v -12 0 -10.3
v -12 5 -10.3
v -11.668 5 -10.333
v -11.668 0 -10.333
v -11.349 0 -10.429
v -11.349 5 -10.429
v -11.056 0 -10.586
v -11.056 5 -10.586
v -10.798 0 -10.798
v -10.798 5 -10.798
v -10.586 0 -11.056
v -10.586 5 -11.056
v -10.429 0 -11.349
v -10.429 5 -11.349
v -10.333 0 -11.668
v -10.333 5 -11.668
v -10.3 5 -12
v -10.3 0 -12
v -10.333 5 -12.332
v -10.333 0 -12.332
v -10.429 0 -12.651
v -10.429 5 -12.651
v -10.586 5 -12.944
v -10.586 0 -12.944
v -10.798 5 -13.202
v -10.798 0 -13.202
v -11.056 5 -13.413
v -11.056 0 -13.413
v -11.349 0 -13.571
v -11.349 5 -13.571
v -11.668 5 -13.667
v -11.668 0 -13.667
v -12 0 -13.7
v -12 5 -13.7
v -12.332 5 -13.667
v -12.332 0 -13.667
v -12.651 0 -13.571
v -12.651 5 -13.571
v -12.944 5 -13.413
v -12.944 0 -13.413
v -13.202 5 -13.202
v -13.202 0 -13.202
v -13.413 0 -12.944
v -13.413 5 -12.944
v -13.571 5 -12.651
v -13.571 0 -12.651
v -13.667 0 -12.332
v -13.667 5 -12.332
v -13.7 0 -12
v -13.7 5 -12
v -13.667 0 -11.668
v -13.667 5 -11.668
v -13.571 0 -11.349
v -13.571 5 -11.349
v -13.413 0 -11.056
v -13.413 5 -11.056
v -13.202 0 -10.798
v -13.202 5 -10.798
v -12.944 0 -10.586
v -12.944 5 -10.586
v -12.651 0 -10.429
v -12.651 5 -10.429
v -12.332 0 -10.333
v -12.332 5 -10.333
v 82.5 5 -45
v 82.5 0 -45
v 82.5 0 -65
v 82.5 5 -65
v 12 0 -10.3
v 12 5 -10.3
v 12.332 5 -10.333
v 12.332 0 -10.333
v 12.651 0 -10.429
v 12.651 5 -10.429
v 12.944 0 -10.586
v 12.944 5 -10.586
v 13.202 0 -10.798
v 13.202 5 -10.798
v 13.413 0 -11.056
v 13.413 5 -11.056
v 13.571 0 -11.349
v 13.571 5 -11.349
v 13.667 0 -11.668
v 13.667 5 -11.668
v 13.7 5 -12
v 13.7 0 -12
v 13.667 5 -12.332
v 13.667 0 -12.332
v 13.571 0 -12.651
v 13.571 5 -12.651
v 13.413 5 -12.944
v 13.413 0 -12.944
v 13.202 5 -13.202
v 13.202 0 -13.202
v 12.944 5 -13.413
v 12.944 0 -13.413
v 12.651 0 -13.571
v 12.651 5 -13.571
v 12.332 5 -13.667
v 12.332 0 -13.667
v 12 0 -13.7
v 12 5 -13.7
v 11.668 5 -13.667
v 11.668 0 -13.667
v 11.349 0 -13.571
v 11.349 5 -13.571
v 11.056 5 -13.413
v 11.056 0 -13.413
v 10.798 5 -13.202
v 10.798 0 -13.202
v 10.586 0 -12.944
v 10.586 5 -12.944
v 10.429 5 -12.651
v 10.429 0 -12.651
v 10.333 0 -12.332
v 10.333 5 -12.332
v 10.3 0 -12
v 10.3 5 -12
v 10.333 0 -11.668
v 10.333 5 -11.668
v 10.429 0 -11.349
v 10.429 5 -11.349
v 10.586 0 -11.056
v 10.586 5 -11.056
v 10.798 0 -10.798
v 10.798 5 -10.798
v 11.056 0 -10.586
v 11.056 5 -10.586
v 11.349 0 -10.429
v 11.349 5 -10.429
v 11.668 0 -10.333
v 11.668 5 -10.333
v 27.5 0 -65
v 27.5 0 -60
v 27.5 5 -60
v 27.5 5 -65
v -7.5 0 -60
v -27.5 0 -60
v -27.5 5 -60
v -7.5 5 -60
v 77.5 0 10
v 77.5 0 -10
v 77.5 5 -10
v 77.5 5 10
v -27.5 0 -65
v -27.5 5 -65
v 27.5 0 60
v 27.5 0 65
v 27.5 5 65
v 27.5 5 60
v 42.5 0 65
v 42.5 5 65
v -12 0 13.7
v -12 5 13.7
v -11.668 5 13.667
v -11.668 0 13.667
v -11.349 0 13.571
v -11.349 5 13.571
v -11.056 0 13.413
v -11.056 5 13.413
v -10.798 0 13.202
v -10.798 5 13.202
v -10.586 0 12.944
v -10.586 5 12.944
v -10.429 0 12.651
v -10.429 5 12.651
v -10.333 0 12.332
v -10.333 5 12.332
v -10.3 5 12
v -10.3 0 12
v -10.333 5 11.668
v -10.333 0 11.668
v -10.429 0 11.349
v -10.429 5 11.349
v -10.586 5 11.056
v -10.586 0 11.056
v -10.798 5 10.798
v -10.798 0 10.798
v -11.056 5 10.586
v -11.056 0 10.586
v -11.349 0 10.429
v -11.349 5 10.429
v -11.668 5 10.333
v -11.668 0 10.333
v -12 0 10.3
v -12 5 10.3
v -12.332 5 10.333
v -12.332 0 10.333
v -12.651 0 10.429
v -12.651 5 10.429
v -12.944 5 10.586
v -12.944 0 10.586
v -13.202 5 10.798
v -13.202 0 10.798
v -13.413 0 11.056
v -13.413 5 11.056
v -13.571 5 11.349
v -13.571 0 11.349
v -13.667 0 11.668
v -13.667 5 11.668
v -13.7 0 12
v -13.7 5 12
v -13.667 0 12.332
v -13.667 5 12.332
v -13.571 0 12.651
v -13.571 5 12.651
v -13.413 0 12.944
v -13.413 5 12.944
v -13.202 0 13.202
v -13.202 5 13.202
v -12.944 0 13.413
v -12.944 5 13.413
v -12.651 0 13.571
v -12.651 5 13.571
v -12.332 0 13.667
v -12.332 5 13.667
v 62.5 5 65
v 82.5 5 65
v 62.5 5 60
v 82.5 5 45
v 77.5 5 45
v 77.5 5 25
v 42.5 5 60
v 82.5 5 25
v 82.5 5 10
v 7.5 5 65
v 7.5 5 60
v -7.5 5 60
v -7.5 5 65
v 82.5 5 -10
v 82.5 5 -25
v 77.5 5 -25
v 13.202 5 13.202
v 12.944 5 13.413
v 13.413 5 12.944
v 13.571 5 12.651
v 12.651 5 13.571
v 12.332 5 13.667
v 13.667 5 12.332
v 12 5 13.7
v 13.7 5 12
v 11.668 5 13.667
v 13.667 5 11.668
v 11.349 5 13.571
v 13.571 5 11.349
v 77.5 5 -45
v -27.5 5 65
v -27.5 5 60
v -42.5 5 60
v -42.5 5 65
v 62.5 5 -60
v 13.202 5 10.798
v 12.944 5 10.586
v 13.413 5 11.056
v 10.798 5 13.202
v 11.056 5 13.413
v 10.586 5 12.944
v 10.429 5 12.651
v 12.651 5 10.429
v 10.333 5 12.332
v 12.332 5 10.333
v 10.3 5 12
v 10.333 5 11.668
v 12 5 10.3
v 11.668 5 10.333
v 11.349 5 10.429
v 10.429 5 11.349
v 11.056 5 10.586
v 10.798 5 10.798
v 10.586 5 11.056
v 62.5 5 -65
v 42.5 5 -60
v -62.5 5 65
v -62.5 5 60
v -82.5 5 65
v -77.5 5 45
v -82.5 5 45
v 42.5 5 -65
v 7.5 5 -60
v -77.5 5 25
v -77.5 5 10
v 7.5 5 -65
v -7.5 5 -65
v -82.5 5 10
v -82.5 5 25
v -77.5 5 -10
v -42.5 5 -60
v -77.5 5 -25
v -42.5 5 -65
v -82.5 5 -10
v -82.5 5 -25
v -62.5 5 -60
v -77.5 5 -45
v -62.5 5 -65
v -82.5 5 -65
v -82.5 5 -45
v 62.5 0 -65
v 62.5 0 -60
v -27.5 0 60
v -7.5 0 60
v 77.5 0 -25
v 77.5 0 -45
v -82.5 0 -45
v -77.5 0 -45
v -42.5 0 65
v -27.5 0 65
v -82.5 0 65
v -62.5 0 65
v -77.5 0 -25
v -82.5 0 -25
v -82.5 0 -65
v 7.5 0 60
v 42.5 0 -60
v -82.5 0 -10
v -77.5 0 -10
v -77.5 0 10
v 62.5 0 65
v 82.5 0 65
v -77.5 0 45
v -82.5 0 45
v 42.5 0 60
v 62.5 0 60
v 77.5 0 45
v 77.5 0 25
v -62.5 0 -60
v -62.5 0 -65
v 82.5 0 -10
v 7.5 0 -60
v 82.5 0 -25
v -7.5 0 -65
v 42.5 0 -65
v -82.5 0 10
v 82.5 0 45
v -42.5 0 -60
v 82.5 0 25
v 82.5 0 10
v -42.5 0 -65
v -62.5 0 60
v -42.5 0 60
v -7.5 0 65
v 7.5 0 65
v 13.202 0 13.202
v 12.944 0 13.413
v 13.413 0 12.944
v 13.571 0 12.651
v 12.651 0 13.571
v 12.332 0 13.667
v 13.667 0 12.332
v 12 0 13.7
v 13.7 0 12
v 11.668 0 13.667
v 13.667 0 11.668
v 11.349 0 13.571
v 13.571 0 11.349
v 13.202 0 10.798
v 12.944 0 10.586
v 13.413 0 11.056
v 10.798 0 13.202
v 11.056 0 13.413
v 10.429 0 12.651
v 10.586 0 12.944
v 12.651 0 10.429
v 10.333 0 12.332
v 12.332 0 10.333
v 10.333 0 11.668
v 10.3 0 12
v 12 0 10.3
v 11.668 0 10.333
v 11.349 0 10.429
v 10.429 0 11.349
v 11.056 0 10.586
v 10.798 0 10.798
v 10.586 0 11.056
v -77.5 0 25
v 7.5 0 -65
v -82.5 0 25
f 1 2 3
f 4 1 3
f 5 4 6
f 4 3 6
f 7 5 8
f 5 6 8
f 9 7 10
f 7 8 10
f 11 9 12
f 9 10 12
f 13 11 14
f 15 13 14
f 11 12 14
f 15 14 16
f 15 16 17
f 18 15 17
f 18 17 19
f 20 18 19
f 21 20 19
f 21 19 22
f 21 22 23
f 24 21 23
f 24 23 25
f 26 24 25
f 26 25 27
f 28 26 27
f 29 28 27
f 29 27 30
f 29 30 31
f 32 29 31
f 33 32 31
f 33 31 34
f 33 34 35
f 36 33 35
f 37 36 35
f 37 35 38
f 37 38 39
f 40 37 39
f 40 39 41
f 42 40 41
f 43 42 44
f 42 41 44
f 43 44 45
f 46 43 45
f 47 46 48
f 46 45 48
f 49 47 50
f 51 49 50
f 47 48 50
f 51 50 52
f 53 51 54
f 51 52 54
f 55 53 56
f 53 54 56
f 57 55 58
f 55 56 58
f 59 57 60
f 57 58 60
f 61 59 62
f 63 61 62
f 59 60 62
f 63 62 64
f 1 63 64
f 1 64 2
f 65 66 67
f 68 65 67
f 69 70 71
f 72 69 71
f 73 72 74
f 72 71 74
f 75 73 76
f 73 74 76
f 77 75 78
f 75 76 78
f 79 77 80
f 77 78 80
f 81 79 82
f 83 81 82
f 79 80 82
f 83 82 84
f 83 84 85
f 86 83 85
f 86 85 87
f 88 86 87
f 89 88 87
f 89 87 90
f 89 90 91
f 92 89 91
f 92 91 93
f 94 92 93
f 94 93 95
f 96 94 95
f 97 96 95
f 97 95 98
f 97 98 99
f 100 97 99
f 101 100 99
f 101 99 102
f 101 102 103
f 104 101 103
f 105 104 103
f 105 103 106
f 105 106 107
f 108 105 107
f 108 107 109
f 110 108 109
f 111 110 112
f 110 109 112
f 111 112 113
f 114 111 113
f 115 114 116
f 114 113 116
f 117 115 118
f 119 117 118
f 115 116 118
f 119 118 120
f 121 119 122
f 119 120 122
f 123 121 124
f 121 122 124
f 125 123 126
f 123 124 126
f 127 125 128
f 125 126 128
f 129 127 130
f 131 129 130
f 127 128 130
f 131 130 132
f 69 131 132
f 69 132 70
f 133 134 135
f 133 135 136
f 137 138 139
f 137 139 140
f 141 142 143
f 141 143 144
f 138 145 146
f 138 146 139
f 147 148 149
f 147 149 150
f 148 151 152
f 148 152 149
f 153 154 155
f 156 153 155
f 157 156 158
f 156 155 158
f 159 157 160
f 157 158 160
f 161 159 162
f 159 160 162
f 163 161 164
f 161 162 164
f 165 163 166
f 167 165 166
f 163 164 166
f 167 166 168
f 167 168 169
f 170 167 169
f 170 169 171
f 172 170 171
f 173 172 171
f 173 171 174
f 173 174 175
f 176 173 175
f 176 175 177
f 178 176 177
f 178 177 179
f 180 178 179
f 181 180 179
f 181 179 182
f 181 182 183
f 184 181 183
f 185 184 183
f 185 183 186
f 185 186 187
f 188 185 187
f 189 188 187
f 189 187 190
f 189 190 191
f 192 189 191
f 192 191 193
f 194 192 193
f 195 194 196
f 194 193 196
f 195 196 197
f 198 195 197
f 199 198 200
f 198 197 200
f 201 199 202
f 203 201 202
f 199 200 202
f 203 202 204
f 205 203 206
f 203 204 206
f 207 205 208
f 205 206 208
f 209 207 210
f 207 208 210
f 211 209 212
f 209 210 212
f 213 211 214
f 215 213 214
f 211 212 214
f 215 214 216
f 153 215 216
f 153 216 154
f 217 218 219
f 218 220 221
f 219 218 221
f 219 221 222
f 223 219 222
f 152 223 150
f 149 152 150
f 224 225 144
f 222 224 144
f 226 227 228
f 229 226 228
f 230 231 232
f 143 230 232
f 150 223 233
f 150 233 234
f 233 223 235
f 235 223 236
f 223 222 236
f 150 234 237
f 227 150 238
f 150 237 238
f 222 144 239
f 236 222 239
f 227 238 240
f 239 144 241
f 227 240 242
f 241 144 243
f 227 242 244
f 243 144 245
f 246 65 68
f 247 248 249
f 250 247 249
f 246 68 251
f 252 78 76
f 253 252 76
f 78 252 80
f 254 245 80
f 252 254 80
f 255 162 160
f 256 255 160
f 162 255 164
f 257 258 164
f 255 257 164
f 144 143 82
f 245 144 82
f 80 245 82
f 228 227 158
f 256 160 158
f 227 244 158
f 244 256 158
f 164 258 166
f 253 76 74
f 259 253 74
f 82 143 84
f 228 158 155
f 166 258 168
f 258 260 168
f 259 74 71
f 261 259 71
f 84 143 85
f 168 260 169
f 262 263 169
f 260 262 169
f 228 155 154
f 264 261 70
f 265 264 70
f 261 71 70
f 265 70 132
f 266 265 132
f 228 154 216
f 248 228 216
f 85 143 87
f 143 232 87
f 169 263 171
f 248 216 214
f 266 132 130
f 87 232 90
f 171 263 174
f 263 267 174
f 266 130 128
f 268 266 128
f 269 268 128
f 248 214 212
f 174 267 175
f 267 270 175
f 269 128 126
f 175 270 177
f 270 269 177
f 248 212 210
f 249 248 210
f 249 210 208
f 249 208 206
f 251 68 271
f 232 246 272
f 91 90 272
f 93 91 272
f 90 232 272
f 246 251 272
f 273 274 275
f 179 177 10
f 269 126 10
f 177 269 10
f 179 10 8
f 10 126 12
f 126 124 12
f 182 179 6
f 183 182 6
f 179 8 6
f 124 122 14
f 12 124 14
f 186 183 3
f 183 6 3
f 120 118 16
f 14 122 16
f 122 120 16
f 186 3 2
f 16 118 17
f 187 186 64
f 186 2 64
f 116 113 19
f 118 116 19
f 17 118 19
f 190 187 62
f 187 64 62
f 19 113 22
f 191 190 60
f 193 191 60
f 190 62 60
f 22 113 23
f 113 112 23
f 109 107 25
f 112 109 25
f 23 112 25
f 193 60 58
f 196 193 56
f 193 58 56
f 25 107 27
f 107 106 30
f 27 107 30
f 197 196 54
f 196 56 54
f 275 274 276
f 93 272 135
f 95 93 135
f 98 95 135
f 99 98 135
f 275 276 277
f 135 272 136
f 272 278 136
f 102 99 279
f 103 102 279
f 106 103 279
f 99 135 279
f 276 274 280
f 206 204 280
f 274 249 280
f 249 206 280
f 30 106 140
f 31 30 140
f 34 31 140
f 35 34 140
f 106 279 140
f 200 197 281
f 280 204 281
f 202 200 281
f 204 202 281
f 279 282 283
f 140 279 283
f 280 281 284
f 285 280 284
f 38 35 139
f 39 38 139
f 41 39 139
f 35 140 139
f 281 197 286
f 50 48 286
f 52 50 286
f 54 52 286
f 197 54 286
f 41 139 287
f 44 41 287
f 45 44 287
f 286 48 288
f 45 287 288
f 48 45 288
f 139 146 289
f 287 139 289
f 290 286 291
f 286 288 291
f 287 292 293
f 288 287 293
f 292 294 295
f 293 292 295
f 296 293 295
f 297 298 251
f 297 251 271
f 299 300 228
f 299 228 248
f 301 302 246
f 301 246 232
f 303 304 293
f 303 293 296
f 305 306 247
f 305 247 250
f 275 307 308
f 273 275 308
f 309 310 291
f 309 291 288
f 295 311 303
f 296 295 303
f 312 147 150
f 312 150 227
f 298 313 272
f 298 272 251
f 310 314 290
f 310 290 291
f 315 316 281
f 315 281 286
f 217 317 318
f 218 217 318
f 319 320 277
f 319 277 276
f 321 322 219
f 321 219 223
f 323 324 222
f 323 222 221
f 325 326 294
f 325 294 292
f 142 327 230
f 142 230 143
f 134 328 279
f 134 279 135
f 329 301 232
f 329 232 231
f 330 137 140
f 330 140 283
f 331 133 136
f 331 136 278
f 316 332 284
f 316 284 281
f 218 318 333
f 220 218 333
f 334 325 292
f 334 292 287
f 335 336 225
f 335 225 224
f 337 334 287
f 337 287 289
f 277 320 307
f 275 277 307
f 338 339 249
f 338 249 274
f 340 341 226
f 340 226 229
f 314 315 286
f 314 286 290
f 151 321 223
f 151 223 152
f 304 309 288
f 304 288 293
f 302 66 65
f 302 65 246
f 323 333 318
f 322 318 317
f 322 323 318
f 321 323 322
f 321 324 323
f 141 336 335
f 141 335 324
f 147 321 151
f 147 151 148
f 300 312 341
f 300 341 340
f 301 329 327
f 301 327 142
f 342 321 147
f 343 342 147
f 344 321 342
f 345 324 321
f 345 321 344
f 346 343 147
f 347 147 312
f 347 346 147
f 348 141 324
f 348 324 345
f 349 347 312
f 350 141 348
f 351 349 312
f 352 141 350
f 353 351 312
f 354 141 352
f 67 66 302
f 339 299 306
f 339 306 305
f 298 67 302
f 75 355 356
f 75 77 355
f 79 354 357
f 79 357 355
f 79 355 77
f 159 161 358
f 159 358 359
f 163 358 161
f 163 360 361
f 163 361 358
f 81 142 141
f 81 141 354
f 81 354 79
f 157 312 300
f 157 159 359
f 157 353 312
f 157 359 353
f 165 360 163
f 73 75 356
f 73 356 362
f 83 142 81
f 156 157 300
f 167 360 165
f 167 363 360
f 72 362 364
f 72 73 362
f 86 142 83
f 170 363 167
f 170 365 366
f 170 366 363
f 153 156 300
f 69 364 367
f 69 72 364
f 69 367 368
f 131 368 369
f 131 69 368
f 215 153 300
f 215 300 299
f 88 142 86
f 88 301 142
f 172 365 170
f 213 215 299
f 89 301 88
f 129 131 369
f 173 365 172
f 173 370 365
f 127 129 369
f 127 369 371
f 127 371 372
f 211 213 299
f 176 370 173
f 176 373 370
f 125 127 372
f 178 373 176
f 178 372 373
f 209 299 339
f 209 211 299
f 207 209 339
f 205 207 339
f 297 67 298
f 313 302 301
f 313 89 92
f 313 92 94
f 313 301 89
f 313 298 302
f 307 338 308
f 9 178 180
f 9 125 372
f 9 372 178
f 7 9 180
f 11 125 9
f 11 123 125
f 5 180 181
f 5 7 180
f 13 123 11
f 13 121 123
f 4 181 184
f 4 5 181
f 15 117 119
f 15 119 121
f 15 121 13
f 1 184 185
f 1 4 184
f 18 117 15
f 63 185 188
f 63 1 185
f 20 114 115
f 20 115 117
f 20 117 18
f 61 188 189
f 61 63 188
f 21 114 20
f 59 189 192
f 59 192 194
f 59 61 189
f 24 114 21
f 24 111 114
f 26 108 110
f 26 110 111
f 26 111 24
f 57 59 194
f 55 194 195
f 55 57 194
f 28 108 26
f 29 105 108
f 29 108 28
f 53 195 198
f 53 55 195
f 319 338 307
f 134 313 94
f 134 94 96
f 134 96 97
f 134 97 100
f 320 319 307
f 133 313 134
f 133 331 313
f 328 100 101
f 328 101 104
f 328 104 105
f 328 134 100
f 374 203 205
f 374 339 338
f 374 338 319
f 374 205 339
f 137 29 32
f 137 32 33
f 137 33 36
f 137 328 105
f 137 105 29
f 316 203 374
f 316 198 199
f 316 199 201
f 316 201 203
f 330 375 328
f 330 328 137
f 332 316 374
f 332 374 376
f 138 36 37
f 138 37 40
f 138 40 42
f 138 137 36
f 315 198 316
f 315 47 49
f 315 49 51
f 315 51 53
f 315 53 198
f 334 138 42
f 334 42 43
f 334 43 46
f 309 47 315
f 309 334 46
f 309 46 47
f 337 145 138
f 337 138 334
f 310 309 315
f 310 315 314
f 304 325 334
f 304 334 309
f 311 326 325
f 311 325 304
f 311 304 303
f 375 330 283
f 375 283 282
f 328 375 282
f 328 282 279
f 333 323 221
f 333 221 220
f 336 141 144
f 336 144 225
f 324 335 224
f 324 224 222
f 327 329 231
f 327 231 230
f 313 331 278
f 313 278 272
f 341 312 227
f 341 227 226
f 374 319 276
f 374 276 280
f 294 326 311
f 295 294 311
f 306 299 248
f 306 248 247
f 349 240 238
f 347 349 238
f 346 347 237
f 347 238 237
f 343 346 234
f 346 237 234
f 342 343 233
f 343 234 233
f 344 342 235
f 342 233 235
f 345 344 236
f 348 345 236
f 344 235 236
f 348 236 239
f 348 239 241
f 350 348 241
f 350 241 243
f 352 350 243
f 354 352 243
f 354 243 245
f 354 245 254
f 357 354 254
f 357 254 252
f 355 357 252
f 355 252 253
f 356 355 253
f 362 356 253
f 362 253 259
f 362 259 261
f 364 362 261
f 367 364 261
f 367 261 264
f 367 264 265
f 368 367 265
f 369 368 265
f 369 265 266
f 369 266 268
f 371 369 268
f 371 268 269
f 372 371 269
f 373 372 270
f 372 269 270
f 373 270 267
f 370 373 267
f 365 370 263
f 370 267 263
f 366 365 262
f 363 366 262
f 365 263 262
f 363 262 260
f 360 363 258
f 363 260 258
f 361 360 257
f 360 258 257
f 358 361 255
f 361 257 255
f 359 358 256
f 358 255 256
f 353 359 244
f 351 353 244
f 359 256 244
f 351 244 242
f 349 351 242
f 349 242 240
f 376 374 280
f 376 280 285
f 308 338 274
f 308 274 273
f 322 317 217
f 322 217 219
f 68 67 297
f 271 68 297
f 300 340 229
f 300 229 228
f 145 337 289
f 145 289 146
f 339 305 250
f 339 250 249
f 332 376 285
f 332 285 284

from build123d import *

# Parameters (mm, degrees)
BOSS_EXTRUDE1_DEPTH = 5
SKETCH2_R           = 1.7
CUT_EXTRUDE1_DEPTH  = 10


with BuildPart() as part:
    # Sketch1 → Boss-Extrude1 (new body)
    with BuildSketch(Plane(origin=(0, 0, 0), x_dir=(1, 0, 0), z_dir=(0, 1, 0))):
        Polygon((-82.5, 60), (-82.5, 65), (-77.5, 65), (-62.5, 65), (-62.5, 60), (-42.5, 60), (-42.5, 65), (-27.5, 65), (-27.5, 60), (-7.5, 60), (-7.5, 65), (7.5, 65), (7.5, 60), (27.5, 60), (27.5, 65), (42.5, 65), (42.5, 60), (62.5, 60), (62.5, 65), (77.5, 65), (82.5, 65), (82.5, 60), (82.5, 45), (77.5, 45), (77.5, 25), (82.5, 25), (82.5, 10), (77.5, 10), (77.5, -10), (82.5, -10), (82.5, -25), (77.5, -25), (77.5, -45), (82.5, -45), (82.5, -60), (82.5, -65), (77.5, -65), (62.5, -65), (62.5, -60), (42.5, -60), (42.5, -65), (27.5, -65), (27.5, -60), (7.5, -60), (7.5, -65), (-7.5, -65), (-7.5, -60), (-27.5, -60), (-27.5, -65), (-42.5, -65), (-42.5, -60), (-62.5, -60), (-62.5, -65), (-77.5, -65), (-82.5, -65), (-82.5, -60), (-82.5, -45), (-77.5, -45), (-77.5, -25), (-82.5, -25), (-82.5, -10), (-77.5, -10), (-77.5, 10), (-82.5, 10), (-82.5, 25), (-77.5, 25), (-77.5, 45), (-82.5, 45), align=None)
    extrude(amount=BOSS_EXTRUDE1_DEPTH)

    # Sketch2 → Cut-Extrude1 (cut)
    with BuildSketch(Plane(origin=(0, 5, 0), x_dir=(1, 0, 0), z_dir=(0, 1, 0))):
        with Locations(Location((-11.999998057, -11.999998057, 0), (0, 0, 270))):
            Circle(SKETCH2_R)
        with Locations(Location((-11.999998057, 11.999998057, 0), (0, 0, 270))):
            Circle(SKETCH2_R)
        with Locations(Location((11.999998057, 11.999998057, 0), (0, 0, 270))):
            Circle(SKETCH2_R)
        with Locations(Location((11.999998057, -11.999998057, 0), (0, 0, 270))):
            Circle(SKETCH2_R)
    extrude(amount=-CUT_EXTRUDE1_DEPTH, mode=Mode.SUBTRACT)


solid = part.part
